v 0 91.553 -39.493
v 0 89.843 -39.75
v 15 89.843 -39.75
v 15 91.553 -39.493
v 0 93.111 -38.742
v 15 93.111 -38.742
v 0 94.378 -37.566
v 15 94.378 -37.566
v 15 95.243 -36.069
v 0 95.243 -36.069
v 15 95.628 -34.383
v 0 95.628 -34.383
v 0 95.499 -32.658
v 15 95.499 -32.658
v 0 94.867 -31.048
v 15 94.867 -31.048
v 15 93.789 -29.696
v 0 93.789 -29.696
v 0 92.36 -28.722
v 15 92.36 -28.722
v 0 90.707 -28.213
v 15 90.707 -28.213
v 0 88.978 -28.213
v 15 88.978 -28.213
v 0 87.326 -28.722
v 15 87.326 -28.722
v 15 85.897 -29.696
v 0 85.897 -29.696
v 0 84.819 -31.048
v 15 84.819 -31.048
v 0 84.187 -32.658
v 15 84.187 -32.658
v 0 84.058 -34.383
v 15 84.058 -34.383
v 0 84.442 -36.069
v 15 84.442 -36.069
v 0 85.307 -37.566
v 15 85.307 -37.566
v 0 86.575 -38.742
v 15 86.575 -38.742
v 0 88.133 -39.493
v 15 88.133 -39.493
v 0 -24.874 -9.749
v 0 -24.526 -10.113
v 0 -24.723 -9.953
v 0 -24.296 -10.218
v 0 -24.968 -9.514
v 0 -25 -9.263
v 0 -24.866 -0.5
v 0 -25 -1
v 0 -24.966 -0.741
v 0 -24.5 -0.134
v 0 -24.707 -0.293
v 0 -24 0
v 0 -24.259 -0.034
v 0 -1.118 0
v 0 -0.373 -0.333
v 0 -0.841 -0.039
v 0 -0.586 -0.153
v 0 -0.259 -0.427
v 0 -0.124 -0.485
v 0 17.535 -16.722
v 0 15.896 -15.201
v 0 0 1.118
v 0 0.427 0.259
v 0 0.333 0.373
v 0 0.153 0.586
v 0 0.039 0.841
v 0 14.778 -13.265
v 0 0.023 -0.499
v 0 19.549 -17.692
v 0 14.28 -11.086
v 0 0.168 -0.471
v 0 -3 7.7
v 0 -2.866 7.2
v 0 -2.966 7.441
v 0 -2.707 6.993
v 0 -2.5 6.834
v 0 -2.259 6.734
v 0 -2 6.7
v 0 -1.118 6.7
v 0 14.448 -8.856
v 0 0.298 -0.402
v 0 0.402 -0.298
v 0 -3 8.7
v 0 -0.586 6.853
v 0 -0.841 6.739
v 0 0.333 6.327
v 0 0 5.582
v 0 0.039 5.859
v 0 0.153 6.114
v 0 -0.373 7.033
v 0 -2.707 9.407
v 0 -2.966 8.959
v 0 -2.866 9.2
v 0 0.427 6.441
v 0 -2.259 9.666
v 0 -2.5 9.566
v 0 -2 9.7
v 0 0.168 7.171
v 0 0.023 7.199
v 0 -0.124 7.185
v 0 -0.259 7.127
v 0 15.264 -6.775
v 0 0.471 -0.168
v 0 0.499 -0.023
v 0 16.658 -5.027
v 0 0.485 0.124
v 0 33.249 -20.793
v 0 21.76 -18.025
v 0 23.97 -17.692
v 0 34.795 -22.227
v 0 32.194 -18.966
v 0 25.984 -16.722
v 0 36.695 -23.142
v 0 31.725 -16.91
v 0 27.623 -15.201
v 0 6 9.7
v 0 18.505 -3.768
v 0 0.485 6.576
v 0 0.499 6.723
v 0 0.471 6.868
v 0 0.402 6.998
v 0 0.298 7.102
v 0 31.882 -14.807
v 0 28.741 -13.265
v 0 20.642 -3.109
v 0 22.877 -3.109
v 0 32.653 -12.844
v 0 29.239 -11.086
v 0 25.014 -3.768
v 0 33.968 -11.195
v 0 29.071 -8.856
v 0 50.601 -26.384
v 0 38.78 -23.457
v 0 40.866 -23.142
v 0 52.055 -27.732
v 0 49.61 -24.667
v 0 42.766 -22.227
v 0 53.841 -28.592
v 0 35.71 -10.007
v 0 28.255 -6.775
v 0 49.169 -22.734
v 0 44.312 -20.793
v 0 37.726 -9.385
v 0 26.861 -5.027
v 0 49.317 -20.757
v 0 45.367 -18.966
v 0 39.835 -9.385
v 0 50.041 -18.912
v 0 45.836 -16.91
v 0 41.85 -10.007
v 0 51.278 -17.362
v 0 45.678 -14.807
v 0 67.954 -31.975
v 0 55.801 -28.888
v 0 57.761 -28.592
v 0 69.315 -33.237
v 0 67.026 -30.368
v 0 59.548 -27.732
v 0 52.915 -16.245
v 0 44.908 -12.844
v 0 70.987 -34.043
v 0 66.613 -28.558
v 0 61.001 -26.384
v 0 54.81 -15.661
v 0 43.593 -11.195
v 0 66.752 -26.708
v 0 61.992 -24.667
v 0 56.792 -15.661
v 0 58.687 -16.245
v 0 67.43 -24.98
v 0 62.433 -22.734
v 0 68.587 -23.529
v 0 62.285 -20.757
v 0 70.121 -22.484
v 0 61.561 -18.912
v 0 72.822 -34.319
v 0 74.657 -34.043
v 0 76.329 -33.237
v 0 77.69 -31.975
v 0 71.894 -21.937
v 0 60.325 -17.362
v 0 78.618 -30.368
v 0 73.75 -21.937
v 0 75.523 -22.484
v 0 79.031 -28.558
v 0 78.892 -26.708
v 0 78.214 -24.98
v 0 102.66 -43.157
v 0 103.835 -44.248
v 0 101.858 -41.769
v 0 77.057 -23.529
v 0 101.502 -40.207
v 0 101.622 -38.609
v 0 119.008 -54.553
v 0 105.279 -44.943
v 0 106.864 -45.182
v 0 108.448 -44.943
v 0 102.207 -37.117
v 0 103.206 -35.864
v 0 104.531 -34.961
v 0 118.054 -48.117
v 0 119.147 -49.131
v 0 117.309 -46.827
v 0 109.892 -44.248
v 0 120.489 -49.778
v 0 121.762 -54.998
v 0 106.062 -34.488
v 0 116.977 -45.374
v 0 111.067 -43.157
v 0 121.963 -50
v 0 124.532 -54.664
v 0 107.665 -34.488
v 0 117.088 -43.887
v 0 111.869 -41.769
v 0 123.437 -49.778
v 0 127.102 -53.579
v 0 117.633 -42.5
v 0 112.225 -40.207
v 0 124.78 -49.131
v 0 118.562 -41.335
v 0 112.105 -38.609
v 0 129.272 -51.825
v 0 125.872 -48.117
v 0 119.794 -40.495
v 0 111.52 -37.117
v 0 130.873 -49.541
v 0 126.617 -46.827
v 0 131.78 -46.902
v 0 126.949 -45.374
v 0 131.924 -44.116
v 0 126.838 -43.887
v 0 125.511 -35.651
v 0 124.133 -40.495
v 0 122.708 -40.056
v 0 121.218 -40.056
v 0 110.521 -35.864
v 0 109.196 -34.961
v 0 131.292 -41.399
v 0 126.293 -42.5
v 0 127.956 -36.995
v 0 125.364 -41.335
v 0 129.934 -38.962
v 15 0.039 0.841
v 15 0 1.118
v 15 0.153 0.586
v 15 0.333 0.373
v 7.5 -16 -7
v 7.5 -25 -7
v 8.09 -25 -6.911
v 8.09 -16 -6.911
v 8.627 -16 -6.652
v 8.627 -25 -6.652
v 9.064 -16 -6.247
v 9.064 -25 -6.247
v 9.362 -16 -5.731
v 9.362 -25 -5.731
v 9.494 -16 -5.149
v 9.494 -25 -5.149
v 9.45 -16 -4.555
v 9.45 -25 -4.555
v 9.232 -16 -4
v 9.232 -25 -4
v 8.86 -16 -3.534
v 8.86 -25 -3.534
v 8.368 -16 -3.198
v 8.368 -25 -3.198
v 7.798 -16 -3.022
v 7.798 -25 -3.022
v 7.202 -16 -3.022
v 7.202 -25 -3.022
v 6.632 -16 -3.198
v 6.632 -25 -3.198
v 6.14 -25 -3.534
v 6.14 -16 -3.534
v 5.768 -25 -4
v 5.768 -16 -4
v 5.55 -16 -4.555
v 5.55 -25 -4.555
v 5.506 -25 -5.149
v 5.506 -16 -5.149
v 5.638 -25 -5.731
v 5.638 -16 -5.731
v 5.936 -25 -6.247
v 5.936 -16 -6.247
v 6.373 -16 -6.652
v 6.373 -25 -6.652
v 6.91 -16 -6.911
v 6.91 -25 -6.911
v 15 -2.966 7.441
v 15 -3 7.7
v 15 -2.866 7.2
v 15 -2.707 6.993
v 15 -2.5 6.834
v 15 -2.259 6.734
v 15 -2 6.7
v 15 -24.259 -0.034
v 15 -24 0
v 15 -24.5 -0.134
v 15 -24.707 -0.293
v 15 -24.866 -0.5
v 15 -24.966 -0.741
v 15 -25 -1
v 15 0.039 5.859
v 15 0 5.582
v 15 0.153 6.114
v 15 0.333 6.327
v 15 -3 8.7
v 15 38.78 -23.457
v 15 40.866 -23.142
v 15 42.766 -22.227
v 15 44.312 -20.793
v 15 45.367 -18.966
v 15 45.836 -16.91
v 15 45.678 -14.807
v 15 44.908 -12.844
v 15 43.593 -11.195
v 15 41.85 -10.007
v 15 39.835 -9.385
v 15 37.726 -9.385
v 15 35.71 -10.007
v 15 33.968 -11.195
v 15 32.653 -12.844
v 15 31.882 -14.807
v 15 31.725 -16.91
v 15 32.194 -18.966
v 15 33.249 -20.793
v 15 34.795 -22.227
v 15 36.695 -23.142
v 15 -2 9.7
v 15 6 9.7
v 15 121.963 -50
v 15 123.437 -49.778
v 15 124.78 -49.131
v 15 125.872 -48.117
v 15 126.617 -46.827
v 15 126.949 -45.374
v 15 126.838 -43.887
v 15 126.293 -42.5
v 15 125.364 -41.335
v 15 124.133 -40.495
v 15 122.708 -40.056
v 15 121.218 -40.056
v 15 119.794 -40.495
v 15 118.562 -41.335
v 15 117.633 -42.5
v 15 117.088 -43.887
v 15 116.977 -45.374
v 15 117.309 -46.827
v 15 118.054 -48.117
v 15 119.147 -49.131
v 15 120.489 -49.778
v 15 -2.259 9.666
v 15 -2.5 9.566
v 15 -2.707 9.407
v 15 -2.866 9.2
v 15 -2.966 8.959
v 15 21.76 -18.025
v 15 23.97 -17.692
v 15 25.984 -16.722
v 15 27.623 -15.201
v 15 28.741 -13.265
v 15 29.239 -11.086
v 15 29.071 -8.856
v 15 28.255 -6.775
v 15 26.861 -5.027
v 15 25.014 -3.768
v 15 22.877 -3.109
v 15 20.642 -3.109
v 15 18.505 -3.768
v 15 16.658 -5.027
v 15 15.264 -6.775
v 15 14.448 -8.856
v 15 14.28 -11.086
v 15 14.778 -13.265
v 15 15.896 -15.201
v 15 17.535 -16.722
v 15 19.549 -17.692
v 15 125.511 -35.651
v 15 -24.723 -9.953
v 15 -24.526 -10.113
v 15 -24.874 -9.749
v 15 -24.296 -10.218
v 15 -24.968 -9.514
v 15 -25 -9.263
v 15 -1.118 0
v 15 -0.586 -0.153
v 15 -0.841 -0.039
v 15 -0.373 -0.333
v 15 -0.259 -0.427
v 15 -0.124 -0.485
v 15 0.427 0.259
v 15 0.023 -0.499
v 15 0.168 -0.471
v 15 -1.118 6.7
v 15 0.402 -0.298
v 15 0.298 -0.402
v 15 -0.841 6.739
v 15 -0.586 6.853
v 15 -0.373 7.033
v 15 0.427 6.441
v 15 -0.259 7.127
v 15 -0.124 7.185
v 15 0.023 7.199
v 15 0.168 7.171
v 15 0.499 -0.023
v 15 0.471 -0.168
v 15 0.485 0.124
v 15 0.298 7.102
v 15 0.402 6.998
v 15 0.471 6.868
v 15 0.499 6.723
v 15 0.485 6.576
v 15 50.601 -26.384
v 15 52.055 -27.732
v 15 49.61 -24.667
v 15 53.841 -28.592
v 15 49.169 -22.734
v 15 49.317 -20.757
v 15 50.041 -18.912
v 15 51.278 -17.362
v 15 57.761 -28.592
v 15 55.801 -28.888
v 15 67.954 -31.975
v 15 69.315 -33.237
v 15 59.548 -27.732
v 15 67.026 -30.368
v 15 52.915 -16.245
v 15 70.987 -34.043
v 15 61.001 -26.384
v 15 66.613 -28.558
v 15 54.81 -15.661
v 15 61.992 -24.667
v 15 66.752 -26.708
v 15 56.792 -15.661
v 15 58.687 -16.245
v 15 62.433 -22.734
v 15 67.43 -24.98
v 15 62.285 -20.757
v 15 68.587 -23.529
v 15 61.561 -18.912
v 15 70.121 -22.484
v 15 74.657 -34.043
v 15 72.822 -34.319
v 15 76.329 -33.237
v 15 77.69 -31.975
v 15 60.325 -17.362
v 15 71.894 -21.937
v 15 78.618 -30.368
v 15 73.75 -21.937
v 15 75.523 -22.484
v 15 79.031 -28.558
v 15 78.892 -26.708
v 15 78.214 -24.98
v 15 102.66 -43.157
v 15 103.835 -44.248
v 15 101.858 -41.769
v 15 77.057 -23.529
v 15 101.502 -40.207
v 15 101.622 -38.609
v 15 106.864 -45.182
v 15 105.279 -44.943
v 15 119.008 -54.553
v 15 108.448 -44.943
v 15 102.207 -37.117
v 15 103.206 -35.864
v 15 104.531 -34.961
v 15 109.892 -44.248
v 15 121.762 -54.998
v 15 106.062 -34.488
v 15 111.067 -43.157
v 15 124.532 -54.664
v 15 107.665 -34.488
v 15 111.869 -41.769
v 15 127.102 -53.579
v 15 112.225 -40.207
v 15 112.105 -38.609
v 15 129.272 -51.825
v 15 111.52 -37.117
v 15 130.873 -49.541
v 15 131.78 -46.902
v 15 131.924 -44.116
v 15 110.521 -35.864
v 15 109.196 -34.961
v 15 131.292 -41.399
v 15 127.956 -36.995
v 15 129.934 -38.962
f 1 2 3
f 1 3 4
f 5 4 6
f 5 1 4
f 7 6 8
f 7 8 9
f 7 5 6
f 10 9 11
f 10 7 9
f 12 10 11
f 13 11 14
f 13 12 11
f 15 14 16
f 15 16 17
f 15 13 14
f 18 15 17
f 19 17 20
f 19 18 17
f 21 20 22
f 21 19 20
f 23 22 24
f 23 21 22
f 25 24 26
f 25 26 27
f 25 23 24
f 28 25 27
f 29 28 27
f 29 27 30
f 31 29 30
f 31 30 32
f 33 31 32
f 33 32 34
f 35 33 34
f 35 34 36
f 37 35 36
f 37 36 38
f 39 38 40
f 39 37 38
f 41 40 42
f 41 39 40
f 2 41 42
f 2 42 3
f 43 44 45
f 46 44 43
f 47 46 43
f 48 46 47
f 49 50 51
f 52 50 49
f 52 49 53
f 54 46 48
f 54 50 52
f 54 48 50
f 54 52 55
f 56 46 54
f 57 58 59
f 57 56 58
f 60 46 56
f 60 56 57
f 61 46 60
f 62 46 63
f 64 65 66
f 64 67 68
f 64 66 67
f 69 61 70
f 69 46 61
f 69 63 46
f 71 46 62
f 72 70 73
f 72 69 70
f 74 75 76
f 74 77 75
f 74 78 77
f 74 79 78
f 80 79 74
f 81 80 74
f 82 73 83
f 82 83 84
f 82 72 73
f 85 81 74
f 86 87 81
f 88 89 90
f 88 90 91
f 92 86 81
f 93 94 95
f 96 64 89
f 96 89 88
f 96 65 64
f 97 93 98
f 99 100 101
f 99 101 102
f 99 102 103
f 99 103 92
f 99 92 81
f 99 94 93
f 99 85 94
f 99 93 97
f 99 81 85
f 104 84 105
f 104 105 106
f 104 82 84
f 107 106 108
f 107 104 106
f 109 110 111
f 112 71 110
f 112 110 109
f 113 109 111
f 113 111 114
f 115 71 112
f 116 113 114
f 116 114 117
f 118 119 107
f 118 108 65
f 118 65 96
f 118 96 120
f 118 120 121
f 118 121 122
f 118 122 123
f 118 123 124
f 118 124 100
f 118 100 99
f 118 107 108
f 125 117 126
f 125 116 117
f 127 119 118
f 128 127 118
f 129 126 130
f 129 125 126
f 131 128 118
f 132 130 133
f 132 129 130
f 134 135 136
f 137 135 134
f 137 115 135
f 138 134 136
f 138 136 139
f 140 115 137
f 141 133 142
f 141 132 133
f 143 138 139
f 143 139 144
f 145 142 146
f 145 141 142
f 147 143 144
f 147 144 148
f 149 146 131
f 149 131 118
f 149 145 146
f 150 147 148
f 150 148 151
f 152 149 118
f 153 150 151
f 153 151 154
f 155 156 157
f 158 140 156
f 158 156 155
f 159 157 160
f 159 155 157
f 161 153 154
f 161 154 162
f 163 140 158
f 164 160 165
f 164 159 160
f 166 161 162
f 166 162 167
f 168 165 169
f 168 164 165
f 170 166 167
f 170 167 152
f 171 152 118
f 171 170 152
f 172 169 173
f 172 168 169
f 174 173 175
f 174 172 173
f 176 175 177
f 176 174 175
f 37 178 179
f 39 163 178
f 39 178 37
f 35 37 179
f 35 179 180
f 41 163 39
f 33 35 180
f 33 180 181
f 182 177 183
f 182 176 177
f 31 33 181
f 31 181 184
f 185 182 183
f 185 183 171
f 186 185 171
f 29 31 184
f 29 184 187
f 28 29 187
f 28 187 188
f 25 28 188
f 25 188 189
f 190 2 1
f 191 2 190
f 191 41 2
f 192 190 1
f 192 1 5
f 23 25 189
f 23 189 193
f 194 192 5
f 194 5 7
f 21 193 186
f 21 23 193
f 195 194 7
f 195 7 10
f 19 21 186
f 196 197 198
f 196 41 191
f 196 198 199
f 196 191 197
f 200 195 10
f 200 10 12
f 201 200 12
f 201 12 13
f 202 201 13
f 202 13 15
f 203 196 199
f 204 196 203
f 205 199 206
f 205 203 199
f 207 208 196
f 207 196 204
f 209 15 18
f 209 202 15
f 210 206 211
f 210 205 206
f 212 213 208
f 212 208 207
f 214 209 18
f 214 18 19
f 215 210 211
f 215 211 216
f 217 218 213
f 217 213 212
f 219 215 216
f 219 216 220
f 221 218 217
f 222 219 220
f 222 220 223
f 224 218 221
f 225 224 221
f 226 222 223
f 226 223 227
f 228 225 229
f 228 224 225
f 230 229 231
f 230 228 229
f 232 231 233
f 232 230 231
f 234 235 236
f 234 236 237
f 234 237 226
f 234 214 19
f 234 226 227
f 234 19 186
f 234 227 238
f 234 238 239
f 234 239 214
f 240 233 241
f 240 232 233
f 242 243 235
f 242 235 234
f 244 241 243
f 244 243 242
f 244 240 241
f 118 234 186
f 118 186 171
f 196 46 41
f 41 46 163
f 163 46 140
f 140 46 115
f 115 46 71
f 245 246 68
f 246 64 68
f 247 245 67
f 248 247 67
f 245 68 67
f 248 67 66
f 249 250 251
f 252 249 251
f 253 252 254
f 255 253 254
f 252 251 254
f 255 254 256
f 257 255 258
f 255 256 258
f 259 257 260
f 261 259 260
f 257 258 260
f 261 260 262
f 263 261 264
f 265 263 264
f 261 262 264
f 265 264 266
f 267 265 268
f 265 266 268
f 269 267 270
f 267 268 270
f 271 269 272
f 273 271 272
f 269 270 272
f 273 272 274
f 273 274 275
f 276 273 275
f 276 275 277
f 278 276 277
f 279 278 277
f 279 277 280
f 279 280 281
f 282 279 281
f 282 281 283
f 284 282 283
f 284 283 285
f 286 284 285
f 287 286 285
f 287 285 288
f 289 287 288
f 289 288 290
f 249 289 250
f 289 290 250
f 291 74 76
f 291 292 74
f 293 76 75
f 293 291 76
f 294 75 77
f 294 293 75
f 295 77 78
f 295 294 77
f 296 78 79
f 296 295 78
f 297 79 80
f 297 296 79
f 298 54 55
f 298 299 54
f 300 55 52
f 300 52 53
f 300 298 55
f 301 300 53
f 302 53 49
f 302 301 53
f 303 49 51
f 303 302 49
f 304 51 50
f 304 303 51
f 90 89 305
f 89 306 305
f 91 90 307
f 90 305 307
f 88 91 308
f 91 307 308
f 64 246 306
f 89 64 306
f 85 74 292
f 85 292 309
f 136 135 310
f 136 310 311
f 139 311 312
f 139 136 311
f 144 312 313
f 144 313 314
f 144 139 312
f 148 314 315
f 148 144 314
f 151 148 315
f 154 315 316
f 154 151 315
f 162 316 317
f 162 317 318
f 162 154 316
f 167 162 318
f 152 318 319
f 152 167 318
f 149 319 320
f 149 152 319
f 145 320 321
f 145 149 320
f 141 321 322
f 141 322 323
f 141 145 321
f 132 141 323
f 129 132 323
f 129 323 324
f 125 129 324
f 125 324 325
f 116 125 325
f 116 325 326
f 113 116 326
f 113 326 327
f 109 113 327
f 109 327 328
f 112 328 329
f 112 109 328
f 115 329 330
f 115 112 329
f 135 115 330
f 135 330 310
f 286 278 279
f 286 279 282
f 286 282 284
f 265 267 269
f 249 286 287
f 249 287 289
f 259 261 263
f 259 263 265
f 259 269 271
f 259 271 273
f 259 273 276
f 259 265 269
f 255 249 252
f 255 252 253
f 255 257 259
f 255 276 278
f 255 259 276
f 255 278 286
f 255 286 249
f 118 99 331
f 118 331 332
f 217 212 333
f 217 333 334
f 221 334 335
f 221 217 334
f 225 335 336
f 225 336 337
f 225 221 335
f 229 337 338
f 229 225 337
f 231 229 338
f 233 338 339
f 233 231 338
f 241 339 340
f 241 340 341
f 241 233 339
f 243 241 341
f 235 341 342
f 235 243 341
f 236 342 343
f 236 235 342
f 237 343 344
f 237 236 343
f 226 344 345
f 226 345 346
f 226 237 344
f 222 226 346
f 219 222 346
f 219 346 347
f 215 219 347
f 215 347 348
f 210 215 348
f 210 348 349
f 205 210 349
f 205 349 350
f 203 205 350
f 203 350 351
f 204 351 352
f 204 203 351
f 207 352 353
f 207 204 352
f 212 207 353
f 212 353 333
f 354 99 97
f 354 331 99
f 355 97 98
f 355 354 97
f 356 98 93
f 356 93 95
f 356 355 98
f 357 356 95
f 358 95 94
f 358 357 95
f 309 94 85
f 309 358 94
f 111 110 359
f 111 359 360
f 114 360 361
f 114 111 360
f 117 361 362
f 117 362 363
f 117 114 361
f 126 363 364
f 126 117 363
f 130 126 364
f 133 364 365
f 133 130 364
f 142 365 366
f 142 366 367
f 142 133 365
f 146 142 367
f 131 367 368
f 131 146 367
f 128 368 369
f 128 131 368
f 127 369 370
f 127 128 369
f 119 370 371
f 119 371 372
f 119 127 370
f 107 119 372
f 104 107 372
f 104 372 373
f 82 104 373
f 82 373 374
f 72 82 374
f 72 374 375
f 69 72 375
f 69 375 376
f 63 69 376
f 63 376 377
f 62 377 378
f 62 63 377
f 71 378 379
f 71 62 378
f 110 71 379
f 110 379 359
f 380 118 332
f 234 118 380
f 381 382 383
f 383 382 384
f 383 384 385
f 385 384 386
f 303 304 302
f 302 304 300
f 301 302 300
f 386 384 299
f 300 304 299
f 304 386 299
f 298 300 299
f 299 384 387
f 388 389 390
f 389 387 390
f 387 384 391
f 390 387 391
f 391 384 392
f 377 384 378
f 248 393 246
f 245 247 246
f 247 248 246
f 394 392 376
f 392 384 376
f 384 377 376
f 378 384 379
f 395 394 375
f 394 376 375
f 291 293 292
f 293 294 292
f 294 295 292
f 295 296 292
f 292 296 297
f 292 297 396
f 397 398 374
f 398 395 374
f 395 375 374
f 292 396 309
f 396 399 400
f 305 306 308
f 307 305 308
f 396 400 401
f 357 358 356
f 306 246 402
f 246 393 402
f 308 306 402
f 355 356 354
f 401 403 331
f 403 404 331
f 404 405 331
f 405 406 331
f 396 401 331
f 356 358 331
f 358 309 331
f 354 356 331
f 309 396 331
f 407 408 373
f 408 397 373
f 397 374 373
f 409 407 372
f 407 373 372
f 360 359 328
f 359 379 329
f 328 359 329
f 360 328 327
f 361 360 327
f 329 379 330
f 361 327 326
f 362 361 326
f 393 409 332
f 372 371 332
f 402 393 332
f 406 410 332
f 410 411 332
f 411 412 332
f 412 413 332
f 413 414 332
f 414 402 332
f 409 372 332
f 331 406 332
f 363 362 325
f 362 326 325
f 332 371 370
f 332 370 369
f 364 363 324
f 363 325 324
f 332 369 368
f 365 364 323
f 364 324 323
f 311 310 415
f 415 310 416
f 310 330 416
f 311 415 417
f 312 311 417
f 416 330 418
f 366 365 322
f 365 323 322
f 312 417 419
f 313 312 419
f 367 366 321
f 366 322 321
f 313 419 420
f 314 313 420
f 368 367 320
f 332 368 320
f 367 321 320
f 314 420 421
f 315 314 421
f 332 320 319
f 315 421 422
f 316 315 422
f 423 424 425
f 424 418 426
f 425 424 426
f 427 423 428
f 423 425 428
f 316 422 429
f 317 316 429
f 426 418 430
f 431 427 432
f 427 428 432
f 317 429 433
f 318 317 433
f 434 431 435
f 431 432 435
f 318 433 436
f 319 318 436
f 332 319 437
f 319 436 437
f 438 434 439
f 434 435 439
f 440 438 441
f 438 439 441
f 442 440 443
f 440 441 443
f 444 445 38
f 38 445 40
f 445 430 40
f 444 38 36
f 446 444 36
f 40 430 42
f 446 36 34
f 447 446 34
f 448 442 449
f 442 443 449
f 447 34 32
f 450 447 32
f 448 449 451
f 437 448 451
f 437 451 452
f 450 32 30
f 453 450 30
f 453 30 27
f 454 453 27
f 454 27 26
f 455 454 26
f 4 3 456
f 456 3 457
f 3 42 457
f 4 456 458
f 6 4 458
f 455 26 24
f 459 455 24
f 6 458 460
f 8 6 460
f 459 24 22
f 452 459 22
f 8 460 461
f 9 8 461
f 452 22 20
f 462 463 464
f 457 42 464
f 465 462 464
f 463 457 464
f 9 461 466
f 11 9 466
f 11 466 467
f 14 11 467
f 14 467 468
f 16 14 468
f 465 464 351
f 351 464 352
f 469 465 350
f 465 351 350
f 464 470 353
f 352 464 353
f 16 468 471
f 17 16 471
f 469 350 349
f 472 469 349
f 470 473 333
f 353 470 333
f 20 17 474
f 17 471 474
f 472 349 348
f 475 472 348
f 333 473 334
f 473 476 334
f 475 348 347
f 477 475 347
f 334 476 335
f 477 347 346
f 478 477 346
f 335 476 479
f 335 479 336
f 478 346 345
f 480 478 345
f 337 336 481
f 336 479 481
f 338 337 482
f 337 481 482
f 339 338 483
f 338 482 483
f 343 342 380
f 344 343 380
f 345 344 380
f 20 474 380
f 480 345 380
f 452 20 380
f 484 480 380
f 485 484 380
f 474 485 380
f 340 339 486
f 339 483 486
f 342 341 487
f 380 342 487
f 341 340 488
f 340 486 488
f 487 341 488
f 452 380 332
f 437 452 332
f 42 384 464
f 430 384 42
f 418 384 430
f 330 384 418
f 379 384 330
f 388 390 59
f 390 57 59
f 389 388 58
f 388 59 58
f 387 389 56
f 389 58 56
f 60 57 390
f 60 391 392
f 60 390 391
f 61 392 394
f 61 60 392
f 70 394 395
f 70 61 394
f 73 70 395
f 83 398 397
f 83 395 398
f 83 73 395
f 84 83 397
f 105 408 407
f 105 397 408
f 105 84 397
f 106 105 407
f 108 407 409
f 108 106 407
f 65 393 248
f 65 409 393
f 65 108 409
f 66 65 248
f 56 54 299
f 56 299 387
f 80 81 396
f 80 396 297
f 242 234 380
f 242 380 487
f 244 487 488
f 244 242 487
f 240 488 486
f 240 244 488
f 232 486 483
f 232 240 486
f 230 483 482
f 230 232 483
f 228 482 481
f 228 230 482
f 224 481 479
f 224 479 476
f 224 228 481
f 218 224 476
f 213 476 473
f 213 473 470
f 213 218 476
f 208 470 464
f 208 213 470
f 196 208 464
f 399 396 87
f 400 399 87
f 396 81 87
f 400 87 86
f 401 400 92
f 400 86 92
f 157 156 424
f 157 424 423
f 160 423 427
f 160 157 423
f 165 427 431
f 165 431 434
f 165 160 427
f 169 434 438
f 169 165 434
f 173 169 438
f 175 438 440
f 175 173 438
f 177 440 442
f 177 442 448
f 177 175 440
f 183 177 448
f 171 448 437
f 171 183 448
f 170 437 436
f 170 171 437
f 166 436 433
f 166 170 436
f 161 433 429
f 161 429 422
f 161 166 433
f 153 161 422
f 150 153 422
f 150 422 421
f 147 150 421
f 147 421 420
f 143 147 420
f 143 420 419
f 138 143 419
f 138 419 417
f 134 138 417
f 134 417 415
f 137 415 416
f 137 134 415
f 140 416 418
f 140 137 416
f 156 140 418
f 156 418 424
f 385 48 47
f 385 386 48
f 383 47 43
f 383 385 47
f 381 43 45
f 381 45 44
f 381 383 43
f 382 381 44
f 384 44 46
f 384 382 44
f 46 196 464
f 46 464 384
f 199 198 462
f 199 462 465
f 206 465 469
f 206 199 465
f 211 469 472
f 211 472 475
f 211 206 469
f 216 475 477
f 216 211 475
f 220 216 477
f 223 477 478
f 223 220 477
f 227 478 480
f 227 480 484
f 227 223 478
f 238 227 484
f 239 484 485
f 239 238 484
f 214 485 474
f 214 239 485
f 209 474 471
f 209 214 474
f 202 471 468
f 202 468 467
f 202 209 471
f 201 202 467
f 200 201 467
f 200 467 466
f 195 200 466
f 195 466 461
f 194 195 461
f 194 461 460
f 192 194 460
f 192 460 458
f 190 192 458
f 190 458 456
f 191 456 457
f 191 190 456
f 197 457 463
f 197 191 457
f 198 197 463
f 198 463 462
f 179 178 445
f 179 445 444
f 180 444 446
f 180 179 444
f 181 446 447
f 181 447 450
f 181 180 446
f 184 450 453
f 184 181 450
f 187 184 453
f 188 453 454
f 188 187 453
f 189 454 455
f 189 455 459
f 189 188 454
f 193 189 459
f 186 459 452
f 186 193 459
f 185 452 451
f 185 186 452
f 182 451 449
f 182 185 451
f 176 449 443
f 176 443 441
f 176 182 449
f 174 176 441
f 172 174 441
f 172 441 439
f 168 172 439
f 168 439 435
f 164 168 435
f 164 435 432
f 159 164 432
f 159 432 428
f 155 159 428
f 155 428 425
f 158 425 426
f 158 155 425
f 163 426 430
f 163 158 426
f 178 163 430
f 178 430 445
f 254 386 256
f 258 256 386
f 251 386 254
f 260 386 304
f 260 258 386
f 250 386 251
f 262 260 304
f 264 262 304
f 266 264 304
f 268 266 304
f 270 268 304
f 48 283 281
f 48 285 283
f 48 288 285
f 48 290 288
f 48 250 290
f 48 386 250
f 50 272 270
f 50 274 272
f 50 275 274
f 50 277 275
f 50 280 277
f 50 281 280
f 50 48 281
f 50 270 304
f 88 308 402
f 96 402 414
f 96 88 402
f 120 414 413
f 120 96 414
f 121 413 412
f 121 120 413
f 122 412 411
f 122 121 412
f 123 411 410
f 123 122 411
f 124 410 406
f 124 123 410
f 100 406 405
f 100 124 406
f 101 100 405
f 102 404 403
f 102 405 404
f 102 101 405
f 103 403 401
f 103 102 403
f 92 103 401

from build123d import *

# Parameters (mm, degrees)
SKETCH2_R           = 5
SKETCH2_R_2         = 7.5
SKETCH2_R_3         = 7.07534444
SKETCH2_R_4         = 6.65068888
SKETCH2_R_5         = 6.226033319
SKETCH2_R_6         = 5.801377759
SKETCH2_R_7         = 5.376722199
BOSS_EXTRUDE1_DEPTH = 15
SKETCH3_R           = 0.5
CUT_EXTRUDE2_DEPTH  = 144.75069455
FILLET1_R           = 1
FILLET3_R           = 1
SKETCH4_R           = 2
CUT_EXTRUDE3_DEPTH  = 9


with BuildPart() as part:
    # Sketch2 → Boss-Extrude1 (new body)
    with BuildSketch(Plane(origin=(0, 0, 0), x_dir=(0, 0, -1), z_dir=(1, 0, 0))):
        with BuildLine():
            Line((0, 0), (-6.7, 0))
            Line((-6.7, 0), (-6.7, -3))
            Line((-6.7, -3), (-9.7, -3))
            Line((-9.7, -3), (-9.7, 6))
            Line((-9.7, 6), (35.650511948, 125.510935717))
            ThreePointArc((35.650511948, 125.510935717), (48.253306586, 131.419112363), (54.553243165, 119.007513631))
            Line((54.553243165, 119.007513631), (10, -25))
            Line((10, -25), (0, -25))
            Line((0, -25), (0, 0))
        make_face()
        with Locations((45, 121.963109177)):
            Circle(SKETCH2_R, mode=Mode.SUBTRACT)
        with Locations((10.525284468, 21.759512837)):
            Circle(SKETCH2_R_2, mode=Mode.SUBTRACT)
        with Locations((16.381236323, 38.780318572)):
            Circle(SKETCH2_R_3, mode=Mode.SUBTRACT)
        with Locations((22.237188178, 55.801124308)):
            Circle(SKETCH2_R_4, mode=Mode.SUBTRACT)
        with Locations((28.093140033, 72.821930043)):
            Circle(SKETCH2_R_5, mode=Mode.SUBTRACT)
        with Locations((33.949091887, 89.842735778)):
            Circle(SKETCH2_R_6, mode=Mode.SUBTRACT)
        with Locations((39.805043742, 106.863541513)):
            Circle(SKETCH2_R_7, mode=Mode.SUBTRACT)
    extrude(amount=BOSS_EXTRUDE1_DEPTH)

    # Sketch3 → Cut-Extrude2 (cut, through all)
    with BuildSketch(Plane(origin=(0, 0, 0), x_dir=(0, 0, -1), z_dir=(1, 0, 0))):
        Circle(SKETCH3_R)
        with Locations((-6.7, 0)):
            Circle(SKETCH3_R)
    extrude(amount=CUT_EXTRUDE2_DEPTH, mode=Mode.SUBTRACT)

    # Fillet1
    fillet1_edges = [part.edges().sort_by_distance(p)[0] for p in [
        (7.5, -3, 6.7),
        (7.5, -3, 9.7),
        (7.5, -0.5, 0),
        (7.5, 0, 6.2),
        (7.5, 0, 0.5),
        (7.5, -0.5, 6.7),
    ]]
    fillet(fillet1_edges, radius=FILLET1_R)

    # Fillet3
    fillet3_edges = [part.edges().sort_by_distance(p)[0] for p in [
        (7.5, -25, -10),
        (7.5, -25, 0),
    ]]
    fillet(fillet3_edges, radius=FILLET3_R)

    # Sketch4 → Cut-Extrude3 (cut)
    with BuildSketch(Plane.XZ.offset(25)):
        with Locations(Location((7.5, -5, 0), (0, 0, 270))):
            Circle(SKETCH4_R)
    extrude(amount=-CUT_EXTRUDE3_DEPTH, mode=Mode.SUBTRACT)


solid = part.part
